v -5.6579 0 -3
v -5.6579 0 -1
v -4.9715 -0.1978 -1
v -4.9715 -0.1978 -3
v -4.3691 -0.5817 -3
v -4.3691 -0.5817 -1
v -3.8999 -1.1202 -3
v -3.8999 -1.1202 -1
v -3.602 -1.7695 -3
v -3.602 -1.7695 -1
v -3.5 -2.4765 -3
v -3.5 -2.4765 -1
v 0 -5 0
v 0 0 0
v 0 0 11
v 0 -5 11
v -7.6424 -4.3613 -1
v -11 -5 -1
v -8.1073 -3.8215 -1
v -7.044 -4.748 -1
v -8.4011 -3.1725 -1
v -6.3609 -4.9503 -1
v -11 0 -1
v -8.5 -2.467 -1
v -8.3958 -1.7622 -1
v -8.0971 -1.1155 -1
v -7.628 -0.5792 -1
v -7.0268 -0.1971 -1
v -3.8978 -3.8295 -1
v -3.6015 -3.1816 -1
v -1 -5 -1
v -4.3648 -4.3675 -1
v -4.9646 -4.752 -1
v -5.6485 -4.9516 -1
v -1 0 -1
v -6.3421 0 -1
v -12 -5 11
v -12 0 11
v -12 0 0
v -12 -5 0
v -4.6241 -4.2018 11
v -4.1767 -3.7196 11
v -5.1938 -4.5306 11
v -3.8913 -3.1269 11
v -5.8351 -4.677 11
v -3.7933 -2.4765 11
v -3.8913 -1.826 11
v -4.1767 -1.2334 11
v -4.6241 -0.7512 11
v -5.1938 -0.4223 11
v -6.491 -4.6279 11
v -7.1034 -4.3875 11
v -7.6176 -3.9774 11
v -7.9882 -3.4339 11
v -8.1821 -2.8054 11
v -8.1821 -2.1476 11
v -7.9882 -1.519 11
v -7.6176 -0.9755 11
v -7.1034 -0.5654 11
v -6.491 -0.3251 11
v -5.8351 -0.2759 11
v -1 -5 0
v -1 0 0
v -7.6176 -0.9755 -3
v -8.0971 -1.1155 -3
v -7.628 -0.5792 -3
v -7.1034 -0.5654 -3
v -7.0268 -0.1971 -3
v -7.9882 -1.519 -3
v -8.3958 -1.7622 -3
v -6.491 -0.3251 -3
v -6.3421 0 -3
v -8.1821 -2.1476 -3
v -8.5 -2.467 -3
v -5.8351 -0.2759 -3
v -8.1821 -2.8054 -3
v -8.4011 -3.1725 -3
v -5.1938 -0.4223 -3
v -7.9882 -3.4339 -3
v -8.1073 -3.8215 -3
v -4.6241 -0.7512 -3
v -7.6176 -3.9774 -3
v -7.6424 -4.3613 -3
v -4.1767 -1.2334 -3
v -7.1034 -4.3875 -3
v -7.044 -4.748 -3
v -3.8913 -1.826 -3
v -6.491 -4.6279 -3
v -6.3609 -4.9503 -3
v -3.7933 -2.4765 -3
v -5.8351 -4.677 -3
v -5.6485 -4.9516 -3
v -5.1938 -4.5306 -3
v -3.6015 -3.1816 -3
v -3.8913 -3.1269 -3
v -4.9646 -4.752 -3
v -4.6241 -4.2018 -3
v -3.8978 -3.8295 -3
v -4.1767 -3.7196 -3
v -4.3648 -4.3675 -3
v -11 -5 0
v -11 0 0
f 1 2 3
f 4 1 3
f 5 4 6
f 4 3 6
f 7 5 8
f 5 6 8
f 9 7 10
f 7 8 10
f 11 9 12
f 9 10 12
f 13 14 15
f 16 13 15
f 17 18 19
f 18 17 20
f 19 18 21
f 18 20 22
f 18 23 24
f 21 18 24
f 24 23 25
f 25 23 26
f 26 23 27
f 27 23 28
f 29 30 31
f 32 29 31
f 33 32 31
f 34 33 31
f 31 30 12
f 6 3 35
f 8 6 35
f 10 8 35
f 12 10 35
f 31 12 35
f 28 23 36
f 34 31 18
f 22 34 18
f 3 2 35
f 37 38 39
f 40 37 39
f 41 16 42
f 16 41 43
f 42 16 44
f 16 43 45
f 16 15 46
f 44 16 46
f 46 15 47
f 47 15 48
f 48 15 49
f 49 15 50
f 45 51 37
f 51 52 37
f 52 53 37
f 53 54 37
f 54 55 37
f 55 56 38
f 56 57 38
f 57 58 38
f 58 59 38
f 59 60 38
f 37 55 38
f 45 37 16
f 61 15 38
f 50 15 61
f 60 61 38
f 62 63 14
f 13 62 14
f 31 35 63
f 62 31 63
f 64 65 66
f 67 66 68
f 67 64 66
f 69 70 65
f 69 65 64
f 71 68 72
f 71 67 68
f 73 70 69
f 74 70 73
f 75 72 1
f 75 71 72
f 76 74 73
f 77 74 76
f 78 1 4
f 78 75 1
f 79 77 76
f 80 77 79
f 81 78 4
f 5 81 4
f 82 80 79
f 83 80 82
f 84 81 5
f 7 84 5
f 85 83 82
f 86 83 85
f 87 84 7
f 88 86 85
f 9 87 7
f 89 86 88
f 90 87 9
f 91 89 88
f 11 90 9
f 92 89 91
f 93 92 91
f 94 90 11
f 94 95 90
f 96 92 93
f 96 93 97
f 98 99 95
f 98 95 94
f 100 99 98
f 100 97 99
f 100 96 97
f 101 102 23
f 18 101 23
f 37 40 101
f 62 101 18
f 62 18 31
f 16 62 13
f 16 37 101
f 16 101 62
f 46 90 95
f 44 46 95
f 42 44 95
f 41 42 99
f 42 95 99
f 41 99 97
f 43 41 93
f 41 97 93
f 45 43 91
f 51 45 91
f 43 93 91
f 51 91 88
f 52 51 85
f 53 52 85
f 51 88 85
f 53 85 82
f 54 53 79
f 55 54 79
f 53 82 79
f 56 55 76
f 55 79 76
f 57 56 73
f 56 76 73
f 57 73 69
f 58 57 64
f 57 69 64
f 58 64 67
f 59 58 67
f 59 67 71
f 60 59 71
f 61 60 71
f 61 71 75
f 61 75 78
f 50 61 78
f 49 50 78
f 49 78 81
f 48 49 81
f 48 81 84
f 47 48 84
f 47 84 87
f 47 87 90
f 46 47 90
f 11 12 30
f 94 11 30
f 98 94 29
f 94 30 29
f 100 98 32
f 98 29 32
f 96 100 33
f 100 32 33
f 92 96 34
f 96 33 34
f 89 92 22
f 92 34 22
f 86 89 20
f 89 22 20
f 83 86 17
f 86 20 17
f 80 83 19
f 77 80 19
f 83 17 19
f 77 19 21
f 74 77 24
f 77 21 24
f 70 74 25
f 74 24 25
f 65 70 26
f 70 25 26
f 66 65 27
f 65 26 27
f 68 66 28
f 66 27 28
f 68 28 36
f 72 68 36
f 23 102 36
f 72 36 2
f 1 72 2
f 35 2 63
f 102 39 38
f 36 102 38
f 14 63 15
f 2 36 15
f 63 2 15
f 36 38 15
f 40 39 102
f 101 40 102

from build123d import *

# Parameters (mm, degrees)
F1_DEPTH = 5
F3_DEPTH = 2
F4_R     = 2.20671025
F5_DEPTH = 25


with BuildPart() as f1:
    # F0 (on Front) → F1 (new body)
    with BuildSketch(Plane.XZ):
        Polygon((0, 11), (-12, 11), (-12, 0), (-11, 0), (-11, -1), (-1, -1), (-1, 0), (0, 0), align=None)
    extrude(amount=F1_DEPTH)

    # F2 (on face) → F3 (join)
    with BuildSketch(Plane(origin=(0, 0, -1), x_dir=(1, 0, 0), z_dir=(0, 0, -1))):
        with BuildLine():
            ThreePointArc((-5.6578661307, 0), (-4.1151479271, 0.8341224011), (-3.5, 2.4764782283))
            ThreePointArc((-3.5, 2.4764782283), (-7.6423558273, 4.3613303012), (-6.3421338693, 0))
            Line((-6.3421338693, 0), (-5.6578661307, 0))
        make_face()
    extrude(amount=F3_DEPTH)

    # F4 (on face) → F5 (cut)
    with BuildSketch(Plane(origin=(0, 0, -3), x_dir=(1, 0, 0), z_dir=(0, 0, -1))):
        with Locations((-6, 2.4764782283)):
            Circle(F4_R)
    extrude(amount=-F5_DEPTH, mode=Mode.SUBTRACT)


solid = f1.part
